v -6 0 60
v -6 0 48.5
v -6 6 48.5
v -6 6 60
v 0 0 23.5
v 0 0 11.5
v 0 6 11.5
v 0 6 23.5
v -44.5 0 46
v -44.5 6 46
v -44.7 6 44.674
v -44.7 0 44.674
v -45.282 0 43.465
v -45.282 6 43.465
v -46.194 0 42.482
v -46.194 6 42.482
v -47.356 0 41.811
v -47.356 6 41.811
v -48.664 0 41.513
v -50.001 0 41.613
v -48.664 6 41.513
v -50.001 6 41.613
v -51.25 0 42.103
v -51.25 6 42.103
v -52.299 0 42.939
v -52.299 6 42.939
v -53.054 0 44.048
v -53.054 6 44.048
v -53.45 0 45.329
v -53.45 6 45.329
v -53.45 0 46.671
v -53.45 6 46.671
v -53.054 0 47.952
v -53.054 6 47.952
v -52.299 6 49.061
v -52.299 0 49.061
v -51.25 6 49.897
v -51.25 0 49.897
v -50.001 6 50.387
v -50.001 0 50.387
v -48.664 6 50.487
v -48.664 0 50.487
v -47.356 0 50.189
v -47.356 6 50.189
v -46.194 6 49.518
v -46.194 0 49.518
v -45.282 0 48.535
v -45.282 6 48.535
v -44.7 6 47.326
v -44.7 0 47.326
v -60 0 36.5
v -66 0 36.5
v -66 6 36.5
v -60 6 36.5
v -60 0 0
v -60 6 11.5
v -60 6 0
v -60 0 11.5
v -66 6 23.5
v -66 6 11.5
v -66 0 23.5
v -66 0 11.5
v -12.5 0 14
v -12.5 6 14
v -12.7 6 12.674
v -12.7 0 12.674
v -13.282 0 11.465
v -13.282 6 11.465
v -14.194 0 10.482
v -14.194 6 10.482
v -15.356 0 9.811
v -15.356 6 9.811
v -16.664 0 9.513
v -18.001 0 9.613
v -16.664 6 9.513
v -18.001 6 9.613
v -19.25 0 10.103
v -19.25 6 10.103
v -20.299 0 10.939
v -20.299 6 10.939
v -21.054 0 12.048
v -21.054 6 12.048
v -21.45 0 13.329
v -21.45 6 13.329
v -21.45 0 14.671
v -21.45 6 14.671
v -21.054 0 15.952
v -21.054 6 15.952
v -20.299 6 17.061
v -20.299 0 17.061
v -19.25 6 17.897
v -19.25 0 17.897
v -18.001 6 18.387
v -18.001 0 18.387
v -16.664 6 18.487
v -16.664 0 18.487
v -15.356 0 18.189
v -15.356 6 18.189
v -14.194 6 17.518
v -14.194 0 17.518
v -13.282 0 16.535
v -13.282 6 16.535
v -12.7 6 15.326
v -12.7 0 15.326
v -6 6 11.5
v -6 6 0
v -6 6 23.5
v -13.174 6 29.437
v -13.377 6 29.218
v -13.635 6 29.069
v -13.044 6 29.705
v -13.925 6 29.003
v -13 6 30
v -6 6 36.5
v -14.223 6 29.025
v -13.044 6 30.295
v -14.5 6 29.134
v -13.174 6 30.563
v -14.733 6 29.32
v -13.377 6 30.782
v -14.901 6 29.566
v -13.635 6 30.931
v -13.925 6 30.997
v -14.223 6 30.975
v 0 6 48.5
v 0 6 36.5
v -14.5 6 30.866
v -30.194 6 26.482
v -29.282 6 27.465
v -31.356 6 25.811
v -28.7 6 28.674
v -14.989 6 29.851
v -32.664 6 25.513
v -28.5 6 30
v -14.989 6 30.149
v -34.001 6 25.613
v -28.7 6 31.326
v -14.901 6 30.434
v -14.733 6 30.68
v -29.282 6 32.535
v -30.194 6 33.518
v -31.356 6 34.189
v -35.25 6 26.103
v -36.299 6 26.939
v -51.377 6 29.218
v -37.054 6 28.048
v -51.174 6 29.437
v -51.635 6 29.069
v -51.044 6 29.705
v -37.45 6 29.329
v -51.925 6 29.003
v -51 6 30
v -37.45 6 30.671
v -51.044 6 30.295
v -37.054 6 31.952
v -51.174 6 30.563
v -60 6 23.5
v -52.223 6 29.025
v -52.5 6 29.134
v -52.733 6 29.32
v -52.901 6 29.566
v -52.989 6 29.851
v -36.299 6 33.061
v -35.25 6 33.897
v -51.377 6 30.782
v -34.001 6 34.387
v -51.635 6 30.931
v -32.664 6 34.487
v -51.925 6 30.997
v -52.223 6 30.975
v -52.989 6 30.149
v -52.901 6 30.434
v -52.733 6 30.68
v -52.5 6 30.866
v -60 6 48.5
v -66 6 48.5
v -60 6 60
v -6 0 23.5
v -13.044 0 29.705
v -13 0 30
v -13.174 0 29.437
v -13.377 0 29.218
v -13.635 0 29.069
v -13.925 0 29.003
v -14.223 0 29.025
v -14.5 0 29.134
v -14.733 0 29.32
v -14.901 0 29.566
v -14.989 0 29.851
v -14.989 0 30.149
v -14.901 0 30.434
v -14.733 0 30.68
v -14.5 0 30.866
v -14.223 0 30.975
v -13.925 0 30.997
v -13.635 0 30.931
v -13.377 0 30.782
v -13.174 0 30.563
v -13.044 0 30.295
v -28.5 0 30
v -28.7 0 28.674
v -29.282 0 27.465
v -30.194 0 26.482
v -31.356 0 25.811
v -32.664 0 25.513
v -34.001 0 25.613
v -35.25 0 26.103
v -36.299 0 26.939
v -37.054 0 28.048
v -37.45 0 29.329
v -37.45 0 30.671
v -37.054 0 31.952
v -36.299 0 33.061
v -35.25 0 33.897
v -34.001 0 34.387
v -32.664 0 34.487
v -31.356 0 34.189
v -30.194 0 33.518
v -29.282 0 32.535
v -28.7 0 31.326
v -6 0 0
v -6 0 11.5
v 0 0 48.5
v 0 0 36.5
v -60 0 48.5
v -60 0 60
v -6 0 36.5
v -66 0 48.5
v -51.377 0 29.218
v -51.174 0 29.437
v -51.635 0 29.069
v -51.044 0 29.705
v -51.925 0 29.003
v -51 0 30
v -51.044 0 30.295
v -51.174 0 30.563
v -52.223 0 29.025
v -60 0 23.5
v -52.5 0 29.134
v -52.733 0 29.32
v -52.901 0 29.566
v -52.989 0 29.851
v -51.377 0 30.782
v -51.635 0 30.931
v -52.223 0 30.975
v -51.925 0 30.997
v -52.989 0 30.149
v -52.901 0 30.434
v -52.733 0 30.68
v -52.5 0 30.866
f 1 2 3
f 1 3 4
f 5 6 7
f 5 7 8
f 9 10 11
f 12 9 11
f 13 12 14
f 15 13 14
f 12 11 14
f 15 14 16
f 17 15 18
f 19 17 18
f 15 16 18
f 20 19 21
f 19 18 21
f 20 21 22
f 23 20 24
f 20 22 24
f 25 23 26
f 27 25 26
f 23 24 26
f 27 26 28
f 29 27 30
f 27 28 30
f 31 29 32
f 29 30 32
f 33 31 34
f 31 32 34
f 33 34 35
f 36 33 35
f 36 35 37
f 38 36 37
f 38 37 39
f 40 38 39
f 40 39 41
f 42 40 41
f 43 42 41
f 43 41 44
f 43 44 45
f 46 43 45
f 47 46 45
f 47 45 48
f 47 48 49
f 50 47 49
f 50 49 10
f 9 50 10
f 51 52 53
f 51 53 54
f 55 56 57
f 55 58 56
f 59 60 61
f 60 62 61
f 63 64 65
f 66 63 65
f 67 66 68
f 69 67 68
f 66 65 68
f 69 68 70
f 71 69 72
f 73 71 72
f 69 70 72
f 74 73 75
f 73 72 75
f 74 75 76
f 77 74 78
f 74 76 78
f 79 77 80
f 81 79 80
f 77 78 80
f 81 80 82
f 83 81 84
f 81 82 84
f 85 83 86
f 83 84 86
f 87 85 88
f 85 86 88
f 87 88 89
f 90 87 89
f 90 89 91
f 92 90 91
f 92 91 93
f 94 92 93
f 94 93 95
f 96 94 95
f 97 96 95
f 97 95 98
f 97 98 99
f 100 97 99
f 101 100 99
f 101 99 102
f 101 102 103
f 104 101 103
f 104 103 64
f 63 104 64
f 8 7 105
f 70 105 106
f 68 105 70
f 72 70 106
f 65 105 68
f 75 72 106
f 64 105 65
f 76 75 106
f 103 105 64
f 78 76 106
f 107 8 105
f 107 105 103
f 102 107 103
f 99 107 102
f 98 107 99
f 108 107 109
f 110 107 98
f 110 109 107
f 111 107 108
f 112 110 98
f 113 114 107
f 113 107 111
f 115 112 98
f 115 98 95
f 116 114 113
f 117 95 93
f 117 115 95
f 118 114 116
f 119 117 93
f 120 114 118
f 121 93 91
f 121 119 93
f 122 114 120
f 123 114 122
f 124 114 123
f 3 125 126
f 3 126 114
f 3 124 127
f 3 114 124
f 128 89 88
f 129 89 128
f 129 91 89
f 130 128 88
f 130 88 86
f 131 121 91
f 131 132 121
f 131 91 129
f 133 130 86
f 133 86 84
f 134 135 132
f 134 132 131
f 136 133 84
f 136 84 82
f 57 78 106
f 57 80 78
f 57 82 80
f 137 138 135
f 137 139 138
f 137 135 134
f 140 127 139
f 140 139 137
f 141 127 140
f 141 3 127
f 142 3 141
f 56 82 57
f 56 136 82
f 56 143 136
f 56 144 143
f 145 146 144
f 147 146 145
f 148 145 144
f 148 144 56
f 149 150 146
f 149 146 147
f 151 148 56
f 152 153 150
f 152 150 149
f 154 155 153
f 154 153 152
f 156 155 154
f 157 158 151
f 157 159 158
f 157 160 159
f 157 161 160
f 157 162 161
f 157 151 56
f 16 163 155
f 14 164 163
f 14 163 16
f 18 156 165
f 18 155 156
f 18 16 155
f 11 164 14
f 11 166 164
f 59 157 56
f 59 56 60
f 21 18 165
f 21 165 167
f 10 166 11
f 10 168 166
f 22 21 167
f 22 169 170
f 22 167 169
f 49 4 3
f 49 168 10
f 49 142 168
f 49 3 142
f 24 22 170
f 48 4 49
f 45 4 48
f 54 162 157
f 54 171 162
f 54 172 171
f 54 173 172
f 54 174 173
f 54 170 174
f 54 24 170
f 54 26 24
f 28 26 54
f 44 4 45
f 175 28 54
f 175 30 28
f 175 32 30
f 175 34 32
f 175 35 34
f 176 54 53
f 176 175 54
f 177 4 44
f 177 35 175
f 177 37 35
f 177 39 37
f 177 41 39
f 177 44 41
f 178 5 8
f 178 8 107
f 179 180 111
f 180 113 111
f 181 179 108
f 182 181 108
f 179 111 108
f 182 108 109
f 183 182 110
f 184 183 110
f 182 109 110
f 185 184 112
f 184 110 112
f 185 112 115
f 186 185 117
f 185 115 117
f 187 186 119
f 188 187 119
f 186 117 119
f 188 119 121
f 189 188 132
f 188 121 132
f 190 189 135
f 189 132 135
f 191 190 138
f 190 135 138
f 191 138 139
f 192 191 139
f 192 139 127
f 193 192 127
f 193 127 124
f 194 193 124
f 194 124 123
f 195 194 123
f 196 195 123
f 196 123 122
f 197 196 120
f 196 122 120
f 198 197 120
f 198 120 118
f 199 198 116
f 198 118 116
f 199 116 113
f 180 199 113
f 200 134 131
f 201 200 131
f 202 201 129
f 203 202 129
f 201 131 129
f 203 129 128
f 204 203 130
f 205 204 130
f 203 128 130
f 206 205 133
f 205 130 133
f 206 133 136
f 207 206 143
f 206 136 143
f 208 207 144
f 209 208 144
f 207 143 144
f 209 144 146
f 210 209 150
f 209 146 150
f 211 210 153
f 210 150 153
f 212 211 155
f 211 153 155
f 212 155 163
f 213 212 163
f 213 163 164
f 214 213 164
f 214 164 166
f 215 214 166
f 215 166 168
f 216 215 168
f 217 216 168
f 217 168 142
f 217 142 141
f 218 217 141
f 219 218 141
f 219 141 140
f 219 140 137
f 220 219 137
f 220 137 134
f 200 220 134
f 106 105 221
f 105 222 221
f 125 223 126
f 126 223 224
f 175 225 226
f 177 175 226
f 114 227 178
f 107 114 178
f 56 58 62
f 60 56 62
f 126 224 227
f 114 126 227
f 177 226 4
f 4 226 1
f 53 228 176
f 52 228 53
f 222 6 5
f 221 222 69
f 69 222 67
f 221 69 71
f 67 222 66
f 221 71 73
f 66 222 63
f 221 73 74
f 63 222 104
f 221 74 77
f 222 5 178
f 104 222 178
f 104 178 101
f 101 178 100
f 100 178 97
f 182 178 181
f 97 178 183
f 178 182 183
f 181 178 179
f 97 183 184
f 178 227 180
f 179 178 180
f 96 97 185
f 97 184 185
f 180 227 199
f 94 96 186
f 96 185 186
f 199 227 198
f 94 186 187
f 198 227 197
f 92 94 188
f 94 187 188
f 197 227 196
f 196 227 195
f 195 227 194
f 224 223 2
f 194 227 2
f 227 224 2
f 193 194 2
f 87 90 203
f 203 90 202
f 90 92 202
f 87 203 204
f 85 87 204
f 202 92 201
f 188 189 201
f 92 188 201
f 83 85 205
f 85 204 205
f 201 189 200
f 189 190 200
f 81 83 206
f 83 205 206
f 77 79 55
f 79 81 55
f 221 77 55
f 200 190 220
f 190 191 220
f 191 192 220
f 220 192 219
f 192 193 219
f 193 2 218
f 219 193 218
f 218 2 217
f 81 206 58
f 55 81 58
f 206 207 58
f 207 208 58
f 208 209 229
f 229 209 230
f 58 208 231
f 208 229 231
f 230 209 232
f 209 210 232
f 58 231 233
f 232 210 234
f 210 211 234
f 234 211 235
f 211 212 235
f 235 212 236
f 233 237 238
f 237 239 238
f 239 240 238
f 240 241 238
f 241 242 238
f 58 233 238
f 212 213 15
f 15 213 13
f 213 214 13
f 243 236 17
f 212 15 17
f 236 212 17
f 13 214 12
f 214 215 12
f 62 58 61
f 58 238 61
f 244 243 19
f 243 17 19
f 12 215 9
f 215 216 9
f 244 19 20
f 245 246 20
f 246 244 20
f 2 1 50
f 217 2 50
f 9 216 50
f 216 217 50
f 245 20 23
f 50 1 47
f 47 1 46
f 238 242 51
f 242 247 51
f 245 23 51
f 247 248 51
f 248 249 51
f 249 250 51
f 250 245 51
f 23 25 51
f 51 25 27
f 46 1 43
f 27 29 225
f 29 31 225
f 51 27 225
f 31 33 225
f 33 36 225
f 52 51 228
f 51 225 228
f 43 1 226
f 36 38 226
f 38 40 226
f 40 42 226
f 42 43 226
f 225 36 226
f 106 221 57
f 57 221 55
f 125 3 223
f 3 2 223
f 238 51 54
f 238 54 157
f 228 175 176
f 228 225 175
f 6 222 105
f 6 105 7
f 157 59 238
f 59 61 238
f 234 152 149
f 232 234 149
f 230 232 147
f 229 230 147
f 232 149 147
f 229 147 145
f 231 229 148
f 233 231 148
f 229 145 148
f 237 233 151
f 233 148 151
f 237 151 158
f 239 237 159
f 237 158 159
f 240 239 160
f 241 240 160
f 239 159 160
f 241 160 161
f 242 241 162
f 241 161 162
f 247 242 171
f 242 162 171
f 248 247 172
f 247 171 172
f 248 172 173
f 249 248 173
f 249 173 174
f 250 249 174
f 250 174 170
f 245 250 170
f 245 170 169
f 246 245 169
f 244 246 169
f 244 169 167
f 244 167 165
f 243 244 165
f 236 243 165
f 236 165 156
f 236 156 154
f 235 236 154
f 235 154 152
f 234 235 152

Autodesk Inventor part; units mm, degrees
ref_plane "YZ Plane" through (0, 0, 0) normal (1, 0, 0) x (0, 1, 0)
ref_plane "XZ Plane" through (0, 0, 0) normal (0, 1, 0) x (-1, 0, 0)
ref_plane "XY Plane" through (0, 0, 0) normal (0, 0, 1) x (1, 0, 0)
sketch "Sketch1" plane through (0, 0, 0) normal (0, 1, 0) x (-1, 0, 0)
  line L0 (0, 30) -> (66, 30) construction
  line L1 (66, 36.5) -> (60, 36.5)
  line L2 (60, 36.5) -> (60, 48.5) construction
  line L3 (60, 48.5) -> (66, 48.5)
  line L4 (66, 48.5) -> (66, 36.5)
  line L5 (60, 48.5) -> (60, 60)
  line L6 (60, 60) -> (6, 60)
  line L7 (66, 23.5) -> (60, 23.5)
  line L8 (60, 23.5) -> (60, 11.5) construction
  line L9 (60, 11.5) -> (66, 11.5)
  line L10 (66, 11.5) -> (66, 23.5)
  line L11 (60, 11.5) -> (60, 0)
  line L12 (60, 36.5) -> (60, 23.5)
  line L13 (33, 30) -> (33, 0) construction
  line L14 (0, 36.5) -> (6, 36.5)
  line L15 (6, 36.5) -> (6, 48.5) construction
  line L16 (6, 48.5) -> (0, 48.5)
  line L17 (0, 48.5) -> (0, 36.5)
  line L18 (6, 48.5) -> (6, 60)
  line L19 (0, 23.5) -> (6, 23.5)
  line L20 (6, 23.5) -> (6, 11.5) construction
  line L21 (6, 11.5) -> (0, 11.5)
  line L22 (0, 11.5) -> (0, 23.5)
  line L23 (6, 11.5) -> (6, 0)
  line L24 (6, 36.5) -> (6, 23.5)
  line L25 (6, 0) -> (60, 0)
  dimension "d2" = 6
  dimension "d3" = 12
  dimension "d4" = 18.5
  dimension "d5" = 33
  dimension "d6" = 11.5
  dimension "d7" = 0
extrude "Extrusion1" add sketch "Sketch1" along normal blind 6
sketch "Sketch2" plane through (0, 6, 0) normal (0, 1, 0) x (1, 0, 0)
  line L0 (-6, -36.5) -> (-6, -23.5) projected
  line L1 (-6, -30) -> (-60, -30) construction
  line L2 (-60, -23.5) -> (-60, -36.5) projected
  line L3 (-6, 0) -> (-60, 0) projected
  line L4 (-33, 0) -> (-33, -60) construction
  line L5 (-6, -60) -> (-60, -60) projected
  circle A0 centre (-49, -46) radius 4.5
  circle A1 centre (-17, -14) radius 4.5
  circle A2 centre (-33, -30) radius 4.5
  circle A3 centre (-14, -30) radius 1
  circle A4 centre (-52, -30) radius 1
  point P0 (0, 0)
  dimension "d16" = 9
  dimension "d17" = 9
  dimension "d18" = 16
  dimension "d19" = 16
  dimension "d20" = 16
  dimension "d21" = 16
  dimension "d22" = 9
  dimension "d23" = 2
  dimension "d24" = 2
  dimension "d25" = 19
  dimension "d26" = 19
extrude "Extrusion2" cut sketch "Sketch2" against normal through all
properties part number "thumper-bumper-top-v2"
